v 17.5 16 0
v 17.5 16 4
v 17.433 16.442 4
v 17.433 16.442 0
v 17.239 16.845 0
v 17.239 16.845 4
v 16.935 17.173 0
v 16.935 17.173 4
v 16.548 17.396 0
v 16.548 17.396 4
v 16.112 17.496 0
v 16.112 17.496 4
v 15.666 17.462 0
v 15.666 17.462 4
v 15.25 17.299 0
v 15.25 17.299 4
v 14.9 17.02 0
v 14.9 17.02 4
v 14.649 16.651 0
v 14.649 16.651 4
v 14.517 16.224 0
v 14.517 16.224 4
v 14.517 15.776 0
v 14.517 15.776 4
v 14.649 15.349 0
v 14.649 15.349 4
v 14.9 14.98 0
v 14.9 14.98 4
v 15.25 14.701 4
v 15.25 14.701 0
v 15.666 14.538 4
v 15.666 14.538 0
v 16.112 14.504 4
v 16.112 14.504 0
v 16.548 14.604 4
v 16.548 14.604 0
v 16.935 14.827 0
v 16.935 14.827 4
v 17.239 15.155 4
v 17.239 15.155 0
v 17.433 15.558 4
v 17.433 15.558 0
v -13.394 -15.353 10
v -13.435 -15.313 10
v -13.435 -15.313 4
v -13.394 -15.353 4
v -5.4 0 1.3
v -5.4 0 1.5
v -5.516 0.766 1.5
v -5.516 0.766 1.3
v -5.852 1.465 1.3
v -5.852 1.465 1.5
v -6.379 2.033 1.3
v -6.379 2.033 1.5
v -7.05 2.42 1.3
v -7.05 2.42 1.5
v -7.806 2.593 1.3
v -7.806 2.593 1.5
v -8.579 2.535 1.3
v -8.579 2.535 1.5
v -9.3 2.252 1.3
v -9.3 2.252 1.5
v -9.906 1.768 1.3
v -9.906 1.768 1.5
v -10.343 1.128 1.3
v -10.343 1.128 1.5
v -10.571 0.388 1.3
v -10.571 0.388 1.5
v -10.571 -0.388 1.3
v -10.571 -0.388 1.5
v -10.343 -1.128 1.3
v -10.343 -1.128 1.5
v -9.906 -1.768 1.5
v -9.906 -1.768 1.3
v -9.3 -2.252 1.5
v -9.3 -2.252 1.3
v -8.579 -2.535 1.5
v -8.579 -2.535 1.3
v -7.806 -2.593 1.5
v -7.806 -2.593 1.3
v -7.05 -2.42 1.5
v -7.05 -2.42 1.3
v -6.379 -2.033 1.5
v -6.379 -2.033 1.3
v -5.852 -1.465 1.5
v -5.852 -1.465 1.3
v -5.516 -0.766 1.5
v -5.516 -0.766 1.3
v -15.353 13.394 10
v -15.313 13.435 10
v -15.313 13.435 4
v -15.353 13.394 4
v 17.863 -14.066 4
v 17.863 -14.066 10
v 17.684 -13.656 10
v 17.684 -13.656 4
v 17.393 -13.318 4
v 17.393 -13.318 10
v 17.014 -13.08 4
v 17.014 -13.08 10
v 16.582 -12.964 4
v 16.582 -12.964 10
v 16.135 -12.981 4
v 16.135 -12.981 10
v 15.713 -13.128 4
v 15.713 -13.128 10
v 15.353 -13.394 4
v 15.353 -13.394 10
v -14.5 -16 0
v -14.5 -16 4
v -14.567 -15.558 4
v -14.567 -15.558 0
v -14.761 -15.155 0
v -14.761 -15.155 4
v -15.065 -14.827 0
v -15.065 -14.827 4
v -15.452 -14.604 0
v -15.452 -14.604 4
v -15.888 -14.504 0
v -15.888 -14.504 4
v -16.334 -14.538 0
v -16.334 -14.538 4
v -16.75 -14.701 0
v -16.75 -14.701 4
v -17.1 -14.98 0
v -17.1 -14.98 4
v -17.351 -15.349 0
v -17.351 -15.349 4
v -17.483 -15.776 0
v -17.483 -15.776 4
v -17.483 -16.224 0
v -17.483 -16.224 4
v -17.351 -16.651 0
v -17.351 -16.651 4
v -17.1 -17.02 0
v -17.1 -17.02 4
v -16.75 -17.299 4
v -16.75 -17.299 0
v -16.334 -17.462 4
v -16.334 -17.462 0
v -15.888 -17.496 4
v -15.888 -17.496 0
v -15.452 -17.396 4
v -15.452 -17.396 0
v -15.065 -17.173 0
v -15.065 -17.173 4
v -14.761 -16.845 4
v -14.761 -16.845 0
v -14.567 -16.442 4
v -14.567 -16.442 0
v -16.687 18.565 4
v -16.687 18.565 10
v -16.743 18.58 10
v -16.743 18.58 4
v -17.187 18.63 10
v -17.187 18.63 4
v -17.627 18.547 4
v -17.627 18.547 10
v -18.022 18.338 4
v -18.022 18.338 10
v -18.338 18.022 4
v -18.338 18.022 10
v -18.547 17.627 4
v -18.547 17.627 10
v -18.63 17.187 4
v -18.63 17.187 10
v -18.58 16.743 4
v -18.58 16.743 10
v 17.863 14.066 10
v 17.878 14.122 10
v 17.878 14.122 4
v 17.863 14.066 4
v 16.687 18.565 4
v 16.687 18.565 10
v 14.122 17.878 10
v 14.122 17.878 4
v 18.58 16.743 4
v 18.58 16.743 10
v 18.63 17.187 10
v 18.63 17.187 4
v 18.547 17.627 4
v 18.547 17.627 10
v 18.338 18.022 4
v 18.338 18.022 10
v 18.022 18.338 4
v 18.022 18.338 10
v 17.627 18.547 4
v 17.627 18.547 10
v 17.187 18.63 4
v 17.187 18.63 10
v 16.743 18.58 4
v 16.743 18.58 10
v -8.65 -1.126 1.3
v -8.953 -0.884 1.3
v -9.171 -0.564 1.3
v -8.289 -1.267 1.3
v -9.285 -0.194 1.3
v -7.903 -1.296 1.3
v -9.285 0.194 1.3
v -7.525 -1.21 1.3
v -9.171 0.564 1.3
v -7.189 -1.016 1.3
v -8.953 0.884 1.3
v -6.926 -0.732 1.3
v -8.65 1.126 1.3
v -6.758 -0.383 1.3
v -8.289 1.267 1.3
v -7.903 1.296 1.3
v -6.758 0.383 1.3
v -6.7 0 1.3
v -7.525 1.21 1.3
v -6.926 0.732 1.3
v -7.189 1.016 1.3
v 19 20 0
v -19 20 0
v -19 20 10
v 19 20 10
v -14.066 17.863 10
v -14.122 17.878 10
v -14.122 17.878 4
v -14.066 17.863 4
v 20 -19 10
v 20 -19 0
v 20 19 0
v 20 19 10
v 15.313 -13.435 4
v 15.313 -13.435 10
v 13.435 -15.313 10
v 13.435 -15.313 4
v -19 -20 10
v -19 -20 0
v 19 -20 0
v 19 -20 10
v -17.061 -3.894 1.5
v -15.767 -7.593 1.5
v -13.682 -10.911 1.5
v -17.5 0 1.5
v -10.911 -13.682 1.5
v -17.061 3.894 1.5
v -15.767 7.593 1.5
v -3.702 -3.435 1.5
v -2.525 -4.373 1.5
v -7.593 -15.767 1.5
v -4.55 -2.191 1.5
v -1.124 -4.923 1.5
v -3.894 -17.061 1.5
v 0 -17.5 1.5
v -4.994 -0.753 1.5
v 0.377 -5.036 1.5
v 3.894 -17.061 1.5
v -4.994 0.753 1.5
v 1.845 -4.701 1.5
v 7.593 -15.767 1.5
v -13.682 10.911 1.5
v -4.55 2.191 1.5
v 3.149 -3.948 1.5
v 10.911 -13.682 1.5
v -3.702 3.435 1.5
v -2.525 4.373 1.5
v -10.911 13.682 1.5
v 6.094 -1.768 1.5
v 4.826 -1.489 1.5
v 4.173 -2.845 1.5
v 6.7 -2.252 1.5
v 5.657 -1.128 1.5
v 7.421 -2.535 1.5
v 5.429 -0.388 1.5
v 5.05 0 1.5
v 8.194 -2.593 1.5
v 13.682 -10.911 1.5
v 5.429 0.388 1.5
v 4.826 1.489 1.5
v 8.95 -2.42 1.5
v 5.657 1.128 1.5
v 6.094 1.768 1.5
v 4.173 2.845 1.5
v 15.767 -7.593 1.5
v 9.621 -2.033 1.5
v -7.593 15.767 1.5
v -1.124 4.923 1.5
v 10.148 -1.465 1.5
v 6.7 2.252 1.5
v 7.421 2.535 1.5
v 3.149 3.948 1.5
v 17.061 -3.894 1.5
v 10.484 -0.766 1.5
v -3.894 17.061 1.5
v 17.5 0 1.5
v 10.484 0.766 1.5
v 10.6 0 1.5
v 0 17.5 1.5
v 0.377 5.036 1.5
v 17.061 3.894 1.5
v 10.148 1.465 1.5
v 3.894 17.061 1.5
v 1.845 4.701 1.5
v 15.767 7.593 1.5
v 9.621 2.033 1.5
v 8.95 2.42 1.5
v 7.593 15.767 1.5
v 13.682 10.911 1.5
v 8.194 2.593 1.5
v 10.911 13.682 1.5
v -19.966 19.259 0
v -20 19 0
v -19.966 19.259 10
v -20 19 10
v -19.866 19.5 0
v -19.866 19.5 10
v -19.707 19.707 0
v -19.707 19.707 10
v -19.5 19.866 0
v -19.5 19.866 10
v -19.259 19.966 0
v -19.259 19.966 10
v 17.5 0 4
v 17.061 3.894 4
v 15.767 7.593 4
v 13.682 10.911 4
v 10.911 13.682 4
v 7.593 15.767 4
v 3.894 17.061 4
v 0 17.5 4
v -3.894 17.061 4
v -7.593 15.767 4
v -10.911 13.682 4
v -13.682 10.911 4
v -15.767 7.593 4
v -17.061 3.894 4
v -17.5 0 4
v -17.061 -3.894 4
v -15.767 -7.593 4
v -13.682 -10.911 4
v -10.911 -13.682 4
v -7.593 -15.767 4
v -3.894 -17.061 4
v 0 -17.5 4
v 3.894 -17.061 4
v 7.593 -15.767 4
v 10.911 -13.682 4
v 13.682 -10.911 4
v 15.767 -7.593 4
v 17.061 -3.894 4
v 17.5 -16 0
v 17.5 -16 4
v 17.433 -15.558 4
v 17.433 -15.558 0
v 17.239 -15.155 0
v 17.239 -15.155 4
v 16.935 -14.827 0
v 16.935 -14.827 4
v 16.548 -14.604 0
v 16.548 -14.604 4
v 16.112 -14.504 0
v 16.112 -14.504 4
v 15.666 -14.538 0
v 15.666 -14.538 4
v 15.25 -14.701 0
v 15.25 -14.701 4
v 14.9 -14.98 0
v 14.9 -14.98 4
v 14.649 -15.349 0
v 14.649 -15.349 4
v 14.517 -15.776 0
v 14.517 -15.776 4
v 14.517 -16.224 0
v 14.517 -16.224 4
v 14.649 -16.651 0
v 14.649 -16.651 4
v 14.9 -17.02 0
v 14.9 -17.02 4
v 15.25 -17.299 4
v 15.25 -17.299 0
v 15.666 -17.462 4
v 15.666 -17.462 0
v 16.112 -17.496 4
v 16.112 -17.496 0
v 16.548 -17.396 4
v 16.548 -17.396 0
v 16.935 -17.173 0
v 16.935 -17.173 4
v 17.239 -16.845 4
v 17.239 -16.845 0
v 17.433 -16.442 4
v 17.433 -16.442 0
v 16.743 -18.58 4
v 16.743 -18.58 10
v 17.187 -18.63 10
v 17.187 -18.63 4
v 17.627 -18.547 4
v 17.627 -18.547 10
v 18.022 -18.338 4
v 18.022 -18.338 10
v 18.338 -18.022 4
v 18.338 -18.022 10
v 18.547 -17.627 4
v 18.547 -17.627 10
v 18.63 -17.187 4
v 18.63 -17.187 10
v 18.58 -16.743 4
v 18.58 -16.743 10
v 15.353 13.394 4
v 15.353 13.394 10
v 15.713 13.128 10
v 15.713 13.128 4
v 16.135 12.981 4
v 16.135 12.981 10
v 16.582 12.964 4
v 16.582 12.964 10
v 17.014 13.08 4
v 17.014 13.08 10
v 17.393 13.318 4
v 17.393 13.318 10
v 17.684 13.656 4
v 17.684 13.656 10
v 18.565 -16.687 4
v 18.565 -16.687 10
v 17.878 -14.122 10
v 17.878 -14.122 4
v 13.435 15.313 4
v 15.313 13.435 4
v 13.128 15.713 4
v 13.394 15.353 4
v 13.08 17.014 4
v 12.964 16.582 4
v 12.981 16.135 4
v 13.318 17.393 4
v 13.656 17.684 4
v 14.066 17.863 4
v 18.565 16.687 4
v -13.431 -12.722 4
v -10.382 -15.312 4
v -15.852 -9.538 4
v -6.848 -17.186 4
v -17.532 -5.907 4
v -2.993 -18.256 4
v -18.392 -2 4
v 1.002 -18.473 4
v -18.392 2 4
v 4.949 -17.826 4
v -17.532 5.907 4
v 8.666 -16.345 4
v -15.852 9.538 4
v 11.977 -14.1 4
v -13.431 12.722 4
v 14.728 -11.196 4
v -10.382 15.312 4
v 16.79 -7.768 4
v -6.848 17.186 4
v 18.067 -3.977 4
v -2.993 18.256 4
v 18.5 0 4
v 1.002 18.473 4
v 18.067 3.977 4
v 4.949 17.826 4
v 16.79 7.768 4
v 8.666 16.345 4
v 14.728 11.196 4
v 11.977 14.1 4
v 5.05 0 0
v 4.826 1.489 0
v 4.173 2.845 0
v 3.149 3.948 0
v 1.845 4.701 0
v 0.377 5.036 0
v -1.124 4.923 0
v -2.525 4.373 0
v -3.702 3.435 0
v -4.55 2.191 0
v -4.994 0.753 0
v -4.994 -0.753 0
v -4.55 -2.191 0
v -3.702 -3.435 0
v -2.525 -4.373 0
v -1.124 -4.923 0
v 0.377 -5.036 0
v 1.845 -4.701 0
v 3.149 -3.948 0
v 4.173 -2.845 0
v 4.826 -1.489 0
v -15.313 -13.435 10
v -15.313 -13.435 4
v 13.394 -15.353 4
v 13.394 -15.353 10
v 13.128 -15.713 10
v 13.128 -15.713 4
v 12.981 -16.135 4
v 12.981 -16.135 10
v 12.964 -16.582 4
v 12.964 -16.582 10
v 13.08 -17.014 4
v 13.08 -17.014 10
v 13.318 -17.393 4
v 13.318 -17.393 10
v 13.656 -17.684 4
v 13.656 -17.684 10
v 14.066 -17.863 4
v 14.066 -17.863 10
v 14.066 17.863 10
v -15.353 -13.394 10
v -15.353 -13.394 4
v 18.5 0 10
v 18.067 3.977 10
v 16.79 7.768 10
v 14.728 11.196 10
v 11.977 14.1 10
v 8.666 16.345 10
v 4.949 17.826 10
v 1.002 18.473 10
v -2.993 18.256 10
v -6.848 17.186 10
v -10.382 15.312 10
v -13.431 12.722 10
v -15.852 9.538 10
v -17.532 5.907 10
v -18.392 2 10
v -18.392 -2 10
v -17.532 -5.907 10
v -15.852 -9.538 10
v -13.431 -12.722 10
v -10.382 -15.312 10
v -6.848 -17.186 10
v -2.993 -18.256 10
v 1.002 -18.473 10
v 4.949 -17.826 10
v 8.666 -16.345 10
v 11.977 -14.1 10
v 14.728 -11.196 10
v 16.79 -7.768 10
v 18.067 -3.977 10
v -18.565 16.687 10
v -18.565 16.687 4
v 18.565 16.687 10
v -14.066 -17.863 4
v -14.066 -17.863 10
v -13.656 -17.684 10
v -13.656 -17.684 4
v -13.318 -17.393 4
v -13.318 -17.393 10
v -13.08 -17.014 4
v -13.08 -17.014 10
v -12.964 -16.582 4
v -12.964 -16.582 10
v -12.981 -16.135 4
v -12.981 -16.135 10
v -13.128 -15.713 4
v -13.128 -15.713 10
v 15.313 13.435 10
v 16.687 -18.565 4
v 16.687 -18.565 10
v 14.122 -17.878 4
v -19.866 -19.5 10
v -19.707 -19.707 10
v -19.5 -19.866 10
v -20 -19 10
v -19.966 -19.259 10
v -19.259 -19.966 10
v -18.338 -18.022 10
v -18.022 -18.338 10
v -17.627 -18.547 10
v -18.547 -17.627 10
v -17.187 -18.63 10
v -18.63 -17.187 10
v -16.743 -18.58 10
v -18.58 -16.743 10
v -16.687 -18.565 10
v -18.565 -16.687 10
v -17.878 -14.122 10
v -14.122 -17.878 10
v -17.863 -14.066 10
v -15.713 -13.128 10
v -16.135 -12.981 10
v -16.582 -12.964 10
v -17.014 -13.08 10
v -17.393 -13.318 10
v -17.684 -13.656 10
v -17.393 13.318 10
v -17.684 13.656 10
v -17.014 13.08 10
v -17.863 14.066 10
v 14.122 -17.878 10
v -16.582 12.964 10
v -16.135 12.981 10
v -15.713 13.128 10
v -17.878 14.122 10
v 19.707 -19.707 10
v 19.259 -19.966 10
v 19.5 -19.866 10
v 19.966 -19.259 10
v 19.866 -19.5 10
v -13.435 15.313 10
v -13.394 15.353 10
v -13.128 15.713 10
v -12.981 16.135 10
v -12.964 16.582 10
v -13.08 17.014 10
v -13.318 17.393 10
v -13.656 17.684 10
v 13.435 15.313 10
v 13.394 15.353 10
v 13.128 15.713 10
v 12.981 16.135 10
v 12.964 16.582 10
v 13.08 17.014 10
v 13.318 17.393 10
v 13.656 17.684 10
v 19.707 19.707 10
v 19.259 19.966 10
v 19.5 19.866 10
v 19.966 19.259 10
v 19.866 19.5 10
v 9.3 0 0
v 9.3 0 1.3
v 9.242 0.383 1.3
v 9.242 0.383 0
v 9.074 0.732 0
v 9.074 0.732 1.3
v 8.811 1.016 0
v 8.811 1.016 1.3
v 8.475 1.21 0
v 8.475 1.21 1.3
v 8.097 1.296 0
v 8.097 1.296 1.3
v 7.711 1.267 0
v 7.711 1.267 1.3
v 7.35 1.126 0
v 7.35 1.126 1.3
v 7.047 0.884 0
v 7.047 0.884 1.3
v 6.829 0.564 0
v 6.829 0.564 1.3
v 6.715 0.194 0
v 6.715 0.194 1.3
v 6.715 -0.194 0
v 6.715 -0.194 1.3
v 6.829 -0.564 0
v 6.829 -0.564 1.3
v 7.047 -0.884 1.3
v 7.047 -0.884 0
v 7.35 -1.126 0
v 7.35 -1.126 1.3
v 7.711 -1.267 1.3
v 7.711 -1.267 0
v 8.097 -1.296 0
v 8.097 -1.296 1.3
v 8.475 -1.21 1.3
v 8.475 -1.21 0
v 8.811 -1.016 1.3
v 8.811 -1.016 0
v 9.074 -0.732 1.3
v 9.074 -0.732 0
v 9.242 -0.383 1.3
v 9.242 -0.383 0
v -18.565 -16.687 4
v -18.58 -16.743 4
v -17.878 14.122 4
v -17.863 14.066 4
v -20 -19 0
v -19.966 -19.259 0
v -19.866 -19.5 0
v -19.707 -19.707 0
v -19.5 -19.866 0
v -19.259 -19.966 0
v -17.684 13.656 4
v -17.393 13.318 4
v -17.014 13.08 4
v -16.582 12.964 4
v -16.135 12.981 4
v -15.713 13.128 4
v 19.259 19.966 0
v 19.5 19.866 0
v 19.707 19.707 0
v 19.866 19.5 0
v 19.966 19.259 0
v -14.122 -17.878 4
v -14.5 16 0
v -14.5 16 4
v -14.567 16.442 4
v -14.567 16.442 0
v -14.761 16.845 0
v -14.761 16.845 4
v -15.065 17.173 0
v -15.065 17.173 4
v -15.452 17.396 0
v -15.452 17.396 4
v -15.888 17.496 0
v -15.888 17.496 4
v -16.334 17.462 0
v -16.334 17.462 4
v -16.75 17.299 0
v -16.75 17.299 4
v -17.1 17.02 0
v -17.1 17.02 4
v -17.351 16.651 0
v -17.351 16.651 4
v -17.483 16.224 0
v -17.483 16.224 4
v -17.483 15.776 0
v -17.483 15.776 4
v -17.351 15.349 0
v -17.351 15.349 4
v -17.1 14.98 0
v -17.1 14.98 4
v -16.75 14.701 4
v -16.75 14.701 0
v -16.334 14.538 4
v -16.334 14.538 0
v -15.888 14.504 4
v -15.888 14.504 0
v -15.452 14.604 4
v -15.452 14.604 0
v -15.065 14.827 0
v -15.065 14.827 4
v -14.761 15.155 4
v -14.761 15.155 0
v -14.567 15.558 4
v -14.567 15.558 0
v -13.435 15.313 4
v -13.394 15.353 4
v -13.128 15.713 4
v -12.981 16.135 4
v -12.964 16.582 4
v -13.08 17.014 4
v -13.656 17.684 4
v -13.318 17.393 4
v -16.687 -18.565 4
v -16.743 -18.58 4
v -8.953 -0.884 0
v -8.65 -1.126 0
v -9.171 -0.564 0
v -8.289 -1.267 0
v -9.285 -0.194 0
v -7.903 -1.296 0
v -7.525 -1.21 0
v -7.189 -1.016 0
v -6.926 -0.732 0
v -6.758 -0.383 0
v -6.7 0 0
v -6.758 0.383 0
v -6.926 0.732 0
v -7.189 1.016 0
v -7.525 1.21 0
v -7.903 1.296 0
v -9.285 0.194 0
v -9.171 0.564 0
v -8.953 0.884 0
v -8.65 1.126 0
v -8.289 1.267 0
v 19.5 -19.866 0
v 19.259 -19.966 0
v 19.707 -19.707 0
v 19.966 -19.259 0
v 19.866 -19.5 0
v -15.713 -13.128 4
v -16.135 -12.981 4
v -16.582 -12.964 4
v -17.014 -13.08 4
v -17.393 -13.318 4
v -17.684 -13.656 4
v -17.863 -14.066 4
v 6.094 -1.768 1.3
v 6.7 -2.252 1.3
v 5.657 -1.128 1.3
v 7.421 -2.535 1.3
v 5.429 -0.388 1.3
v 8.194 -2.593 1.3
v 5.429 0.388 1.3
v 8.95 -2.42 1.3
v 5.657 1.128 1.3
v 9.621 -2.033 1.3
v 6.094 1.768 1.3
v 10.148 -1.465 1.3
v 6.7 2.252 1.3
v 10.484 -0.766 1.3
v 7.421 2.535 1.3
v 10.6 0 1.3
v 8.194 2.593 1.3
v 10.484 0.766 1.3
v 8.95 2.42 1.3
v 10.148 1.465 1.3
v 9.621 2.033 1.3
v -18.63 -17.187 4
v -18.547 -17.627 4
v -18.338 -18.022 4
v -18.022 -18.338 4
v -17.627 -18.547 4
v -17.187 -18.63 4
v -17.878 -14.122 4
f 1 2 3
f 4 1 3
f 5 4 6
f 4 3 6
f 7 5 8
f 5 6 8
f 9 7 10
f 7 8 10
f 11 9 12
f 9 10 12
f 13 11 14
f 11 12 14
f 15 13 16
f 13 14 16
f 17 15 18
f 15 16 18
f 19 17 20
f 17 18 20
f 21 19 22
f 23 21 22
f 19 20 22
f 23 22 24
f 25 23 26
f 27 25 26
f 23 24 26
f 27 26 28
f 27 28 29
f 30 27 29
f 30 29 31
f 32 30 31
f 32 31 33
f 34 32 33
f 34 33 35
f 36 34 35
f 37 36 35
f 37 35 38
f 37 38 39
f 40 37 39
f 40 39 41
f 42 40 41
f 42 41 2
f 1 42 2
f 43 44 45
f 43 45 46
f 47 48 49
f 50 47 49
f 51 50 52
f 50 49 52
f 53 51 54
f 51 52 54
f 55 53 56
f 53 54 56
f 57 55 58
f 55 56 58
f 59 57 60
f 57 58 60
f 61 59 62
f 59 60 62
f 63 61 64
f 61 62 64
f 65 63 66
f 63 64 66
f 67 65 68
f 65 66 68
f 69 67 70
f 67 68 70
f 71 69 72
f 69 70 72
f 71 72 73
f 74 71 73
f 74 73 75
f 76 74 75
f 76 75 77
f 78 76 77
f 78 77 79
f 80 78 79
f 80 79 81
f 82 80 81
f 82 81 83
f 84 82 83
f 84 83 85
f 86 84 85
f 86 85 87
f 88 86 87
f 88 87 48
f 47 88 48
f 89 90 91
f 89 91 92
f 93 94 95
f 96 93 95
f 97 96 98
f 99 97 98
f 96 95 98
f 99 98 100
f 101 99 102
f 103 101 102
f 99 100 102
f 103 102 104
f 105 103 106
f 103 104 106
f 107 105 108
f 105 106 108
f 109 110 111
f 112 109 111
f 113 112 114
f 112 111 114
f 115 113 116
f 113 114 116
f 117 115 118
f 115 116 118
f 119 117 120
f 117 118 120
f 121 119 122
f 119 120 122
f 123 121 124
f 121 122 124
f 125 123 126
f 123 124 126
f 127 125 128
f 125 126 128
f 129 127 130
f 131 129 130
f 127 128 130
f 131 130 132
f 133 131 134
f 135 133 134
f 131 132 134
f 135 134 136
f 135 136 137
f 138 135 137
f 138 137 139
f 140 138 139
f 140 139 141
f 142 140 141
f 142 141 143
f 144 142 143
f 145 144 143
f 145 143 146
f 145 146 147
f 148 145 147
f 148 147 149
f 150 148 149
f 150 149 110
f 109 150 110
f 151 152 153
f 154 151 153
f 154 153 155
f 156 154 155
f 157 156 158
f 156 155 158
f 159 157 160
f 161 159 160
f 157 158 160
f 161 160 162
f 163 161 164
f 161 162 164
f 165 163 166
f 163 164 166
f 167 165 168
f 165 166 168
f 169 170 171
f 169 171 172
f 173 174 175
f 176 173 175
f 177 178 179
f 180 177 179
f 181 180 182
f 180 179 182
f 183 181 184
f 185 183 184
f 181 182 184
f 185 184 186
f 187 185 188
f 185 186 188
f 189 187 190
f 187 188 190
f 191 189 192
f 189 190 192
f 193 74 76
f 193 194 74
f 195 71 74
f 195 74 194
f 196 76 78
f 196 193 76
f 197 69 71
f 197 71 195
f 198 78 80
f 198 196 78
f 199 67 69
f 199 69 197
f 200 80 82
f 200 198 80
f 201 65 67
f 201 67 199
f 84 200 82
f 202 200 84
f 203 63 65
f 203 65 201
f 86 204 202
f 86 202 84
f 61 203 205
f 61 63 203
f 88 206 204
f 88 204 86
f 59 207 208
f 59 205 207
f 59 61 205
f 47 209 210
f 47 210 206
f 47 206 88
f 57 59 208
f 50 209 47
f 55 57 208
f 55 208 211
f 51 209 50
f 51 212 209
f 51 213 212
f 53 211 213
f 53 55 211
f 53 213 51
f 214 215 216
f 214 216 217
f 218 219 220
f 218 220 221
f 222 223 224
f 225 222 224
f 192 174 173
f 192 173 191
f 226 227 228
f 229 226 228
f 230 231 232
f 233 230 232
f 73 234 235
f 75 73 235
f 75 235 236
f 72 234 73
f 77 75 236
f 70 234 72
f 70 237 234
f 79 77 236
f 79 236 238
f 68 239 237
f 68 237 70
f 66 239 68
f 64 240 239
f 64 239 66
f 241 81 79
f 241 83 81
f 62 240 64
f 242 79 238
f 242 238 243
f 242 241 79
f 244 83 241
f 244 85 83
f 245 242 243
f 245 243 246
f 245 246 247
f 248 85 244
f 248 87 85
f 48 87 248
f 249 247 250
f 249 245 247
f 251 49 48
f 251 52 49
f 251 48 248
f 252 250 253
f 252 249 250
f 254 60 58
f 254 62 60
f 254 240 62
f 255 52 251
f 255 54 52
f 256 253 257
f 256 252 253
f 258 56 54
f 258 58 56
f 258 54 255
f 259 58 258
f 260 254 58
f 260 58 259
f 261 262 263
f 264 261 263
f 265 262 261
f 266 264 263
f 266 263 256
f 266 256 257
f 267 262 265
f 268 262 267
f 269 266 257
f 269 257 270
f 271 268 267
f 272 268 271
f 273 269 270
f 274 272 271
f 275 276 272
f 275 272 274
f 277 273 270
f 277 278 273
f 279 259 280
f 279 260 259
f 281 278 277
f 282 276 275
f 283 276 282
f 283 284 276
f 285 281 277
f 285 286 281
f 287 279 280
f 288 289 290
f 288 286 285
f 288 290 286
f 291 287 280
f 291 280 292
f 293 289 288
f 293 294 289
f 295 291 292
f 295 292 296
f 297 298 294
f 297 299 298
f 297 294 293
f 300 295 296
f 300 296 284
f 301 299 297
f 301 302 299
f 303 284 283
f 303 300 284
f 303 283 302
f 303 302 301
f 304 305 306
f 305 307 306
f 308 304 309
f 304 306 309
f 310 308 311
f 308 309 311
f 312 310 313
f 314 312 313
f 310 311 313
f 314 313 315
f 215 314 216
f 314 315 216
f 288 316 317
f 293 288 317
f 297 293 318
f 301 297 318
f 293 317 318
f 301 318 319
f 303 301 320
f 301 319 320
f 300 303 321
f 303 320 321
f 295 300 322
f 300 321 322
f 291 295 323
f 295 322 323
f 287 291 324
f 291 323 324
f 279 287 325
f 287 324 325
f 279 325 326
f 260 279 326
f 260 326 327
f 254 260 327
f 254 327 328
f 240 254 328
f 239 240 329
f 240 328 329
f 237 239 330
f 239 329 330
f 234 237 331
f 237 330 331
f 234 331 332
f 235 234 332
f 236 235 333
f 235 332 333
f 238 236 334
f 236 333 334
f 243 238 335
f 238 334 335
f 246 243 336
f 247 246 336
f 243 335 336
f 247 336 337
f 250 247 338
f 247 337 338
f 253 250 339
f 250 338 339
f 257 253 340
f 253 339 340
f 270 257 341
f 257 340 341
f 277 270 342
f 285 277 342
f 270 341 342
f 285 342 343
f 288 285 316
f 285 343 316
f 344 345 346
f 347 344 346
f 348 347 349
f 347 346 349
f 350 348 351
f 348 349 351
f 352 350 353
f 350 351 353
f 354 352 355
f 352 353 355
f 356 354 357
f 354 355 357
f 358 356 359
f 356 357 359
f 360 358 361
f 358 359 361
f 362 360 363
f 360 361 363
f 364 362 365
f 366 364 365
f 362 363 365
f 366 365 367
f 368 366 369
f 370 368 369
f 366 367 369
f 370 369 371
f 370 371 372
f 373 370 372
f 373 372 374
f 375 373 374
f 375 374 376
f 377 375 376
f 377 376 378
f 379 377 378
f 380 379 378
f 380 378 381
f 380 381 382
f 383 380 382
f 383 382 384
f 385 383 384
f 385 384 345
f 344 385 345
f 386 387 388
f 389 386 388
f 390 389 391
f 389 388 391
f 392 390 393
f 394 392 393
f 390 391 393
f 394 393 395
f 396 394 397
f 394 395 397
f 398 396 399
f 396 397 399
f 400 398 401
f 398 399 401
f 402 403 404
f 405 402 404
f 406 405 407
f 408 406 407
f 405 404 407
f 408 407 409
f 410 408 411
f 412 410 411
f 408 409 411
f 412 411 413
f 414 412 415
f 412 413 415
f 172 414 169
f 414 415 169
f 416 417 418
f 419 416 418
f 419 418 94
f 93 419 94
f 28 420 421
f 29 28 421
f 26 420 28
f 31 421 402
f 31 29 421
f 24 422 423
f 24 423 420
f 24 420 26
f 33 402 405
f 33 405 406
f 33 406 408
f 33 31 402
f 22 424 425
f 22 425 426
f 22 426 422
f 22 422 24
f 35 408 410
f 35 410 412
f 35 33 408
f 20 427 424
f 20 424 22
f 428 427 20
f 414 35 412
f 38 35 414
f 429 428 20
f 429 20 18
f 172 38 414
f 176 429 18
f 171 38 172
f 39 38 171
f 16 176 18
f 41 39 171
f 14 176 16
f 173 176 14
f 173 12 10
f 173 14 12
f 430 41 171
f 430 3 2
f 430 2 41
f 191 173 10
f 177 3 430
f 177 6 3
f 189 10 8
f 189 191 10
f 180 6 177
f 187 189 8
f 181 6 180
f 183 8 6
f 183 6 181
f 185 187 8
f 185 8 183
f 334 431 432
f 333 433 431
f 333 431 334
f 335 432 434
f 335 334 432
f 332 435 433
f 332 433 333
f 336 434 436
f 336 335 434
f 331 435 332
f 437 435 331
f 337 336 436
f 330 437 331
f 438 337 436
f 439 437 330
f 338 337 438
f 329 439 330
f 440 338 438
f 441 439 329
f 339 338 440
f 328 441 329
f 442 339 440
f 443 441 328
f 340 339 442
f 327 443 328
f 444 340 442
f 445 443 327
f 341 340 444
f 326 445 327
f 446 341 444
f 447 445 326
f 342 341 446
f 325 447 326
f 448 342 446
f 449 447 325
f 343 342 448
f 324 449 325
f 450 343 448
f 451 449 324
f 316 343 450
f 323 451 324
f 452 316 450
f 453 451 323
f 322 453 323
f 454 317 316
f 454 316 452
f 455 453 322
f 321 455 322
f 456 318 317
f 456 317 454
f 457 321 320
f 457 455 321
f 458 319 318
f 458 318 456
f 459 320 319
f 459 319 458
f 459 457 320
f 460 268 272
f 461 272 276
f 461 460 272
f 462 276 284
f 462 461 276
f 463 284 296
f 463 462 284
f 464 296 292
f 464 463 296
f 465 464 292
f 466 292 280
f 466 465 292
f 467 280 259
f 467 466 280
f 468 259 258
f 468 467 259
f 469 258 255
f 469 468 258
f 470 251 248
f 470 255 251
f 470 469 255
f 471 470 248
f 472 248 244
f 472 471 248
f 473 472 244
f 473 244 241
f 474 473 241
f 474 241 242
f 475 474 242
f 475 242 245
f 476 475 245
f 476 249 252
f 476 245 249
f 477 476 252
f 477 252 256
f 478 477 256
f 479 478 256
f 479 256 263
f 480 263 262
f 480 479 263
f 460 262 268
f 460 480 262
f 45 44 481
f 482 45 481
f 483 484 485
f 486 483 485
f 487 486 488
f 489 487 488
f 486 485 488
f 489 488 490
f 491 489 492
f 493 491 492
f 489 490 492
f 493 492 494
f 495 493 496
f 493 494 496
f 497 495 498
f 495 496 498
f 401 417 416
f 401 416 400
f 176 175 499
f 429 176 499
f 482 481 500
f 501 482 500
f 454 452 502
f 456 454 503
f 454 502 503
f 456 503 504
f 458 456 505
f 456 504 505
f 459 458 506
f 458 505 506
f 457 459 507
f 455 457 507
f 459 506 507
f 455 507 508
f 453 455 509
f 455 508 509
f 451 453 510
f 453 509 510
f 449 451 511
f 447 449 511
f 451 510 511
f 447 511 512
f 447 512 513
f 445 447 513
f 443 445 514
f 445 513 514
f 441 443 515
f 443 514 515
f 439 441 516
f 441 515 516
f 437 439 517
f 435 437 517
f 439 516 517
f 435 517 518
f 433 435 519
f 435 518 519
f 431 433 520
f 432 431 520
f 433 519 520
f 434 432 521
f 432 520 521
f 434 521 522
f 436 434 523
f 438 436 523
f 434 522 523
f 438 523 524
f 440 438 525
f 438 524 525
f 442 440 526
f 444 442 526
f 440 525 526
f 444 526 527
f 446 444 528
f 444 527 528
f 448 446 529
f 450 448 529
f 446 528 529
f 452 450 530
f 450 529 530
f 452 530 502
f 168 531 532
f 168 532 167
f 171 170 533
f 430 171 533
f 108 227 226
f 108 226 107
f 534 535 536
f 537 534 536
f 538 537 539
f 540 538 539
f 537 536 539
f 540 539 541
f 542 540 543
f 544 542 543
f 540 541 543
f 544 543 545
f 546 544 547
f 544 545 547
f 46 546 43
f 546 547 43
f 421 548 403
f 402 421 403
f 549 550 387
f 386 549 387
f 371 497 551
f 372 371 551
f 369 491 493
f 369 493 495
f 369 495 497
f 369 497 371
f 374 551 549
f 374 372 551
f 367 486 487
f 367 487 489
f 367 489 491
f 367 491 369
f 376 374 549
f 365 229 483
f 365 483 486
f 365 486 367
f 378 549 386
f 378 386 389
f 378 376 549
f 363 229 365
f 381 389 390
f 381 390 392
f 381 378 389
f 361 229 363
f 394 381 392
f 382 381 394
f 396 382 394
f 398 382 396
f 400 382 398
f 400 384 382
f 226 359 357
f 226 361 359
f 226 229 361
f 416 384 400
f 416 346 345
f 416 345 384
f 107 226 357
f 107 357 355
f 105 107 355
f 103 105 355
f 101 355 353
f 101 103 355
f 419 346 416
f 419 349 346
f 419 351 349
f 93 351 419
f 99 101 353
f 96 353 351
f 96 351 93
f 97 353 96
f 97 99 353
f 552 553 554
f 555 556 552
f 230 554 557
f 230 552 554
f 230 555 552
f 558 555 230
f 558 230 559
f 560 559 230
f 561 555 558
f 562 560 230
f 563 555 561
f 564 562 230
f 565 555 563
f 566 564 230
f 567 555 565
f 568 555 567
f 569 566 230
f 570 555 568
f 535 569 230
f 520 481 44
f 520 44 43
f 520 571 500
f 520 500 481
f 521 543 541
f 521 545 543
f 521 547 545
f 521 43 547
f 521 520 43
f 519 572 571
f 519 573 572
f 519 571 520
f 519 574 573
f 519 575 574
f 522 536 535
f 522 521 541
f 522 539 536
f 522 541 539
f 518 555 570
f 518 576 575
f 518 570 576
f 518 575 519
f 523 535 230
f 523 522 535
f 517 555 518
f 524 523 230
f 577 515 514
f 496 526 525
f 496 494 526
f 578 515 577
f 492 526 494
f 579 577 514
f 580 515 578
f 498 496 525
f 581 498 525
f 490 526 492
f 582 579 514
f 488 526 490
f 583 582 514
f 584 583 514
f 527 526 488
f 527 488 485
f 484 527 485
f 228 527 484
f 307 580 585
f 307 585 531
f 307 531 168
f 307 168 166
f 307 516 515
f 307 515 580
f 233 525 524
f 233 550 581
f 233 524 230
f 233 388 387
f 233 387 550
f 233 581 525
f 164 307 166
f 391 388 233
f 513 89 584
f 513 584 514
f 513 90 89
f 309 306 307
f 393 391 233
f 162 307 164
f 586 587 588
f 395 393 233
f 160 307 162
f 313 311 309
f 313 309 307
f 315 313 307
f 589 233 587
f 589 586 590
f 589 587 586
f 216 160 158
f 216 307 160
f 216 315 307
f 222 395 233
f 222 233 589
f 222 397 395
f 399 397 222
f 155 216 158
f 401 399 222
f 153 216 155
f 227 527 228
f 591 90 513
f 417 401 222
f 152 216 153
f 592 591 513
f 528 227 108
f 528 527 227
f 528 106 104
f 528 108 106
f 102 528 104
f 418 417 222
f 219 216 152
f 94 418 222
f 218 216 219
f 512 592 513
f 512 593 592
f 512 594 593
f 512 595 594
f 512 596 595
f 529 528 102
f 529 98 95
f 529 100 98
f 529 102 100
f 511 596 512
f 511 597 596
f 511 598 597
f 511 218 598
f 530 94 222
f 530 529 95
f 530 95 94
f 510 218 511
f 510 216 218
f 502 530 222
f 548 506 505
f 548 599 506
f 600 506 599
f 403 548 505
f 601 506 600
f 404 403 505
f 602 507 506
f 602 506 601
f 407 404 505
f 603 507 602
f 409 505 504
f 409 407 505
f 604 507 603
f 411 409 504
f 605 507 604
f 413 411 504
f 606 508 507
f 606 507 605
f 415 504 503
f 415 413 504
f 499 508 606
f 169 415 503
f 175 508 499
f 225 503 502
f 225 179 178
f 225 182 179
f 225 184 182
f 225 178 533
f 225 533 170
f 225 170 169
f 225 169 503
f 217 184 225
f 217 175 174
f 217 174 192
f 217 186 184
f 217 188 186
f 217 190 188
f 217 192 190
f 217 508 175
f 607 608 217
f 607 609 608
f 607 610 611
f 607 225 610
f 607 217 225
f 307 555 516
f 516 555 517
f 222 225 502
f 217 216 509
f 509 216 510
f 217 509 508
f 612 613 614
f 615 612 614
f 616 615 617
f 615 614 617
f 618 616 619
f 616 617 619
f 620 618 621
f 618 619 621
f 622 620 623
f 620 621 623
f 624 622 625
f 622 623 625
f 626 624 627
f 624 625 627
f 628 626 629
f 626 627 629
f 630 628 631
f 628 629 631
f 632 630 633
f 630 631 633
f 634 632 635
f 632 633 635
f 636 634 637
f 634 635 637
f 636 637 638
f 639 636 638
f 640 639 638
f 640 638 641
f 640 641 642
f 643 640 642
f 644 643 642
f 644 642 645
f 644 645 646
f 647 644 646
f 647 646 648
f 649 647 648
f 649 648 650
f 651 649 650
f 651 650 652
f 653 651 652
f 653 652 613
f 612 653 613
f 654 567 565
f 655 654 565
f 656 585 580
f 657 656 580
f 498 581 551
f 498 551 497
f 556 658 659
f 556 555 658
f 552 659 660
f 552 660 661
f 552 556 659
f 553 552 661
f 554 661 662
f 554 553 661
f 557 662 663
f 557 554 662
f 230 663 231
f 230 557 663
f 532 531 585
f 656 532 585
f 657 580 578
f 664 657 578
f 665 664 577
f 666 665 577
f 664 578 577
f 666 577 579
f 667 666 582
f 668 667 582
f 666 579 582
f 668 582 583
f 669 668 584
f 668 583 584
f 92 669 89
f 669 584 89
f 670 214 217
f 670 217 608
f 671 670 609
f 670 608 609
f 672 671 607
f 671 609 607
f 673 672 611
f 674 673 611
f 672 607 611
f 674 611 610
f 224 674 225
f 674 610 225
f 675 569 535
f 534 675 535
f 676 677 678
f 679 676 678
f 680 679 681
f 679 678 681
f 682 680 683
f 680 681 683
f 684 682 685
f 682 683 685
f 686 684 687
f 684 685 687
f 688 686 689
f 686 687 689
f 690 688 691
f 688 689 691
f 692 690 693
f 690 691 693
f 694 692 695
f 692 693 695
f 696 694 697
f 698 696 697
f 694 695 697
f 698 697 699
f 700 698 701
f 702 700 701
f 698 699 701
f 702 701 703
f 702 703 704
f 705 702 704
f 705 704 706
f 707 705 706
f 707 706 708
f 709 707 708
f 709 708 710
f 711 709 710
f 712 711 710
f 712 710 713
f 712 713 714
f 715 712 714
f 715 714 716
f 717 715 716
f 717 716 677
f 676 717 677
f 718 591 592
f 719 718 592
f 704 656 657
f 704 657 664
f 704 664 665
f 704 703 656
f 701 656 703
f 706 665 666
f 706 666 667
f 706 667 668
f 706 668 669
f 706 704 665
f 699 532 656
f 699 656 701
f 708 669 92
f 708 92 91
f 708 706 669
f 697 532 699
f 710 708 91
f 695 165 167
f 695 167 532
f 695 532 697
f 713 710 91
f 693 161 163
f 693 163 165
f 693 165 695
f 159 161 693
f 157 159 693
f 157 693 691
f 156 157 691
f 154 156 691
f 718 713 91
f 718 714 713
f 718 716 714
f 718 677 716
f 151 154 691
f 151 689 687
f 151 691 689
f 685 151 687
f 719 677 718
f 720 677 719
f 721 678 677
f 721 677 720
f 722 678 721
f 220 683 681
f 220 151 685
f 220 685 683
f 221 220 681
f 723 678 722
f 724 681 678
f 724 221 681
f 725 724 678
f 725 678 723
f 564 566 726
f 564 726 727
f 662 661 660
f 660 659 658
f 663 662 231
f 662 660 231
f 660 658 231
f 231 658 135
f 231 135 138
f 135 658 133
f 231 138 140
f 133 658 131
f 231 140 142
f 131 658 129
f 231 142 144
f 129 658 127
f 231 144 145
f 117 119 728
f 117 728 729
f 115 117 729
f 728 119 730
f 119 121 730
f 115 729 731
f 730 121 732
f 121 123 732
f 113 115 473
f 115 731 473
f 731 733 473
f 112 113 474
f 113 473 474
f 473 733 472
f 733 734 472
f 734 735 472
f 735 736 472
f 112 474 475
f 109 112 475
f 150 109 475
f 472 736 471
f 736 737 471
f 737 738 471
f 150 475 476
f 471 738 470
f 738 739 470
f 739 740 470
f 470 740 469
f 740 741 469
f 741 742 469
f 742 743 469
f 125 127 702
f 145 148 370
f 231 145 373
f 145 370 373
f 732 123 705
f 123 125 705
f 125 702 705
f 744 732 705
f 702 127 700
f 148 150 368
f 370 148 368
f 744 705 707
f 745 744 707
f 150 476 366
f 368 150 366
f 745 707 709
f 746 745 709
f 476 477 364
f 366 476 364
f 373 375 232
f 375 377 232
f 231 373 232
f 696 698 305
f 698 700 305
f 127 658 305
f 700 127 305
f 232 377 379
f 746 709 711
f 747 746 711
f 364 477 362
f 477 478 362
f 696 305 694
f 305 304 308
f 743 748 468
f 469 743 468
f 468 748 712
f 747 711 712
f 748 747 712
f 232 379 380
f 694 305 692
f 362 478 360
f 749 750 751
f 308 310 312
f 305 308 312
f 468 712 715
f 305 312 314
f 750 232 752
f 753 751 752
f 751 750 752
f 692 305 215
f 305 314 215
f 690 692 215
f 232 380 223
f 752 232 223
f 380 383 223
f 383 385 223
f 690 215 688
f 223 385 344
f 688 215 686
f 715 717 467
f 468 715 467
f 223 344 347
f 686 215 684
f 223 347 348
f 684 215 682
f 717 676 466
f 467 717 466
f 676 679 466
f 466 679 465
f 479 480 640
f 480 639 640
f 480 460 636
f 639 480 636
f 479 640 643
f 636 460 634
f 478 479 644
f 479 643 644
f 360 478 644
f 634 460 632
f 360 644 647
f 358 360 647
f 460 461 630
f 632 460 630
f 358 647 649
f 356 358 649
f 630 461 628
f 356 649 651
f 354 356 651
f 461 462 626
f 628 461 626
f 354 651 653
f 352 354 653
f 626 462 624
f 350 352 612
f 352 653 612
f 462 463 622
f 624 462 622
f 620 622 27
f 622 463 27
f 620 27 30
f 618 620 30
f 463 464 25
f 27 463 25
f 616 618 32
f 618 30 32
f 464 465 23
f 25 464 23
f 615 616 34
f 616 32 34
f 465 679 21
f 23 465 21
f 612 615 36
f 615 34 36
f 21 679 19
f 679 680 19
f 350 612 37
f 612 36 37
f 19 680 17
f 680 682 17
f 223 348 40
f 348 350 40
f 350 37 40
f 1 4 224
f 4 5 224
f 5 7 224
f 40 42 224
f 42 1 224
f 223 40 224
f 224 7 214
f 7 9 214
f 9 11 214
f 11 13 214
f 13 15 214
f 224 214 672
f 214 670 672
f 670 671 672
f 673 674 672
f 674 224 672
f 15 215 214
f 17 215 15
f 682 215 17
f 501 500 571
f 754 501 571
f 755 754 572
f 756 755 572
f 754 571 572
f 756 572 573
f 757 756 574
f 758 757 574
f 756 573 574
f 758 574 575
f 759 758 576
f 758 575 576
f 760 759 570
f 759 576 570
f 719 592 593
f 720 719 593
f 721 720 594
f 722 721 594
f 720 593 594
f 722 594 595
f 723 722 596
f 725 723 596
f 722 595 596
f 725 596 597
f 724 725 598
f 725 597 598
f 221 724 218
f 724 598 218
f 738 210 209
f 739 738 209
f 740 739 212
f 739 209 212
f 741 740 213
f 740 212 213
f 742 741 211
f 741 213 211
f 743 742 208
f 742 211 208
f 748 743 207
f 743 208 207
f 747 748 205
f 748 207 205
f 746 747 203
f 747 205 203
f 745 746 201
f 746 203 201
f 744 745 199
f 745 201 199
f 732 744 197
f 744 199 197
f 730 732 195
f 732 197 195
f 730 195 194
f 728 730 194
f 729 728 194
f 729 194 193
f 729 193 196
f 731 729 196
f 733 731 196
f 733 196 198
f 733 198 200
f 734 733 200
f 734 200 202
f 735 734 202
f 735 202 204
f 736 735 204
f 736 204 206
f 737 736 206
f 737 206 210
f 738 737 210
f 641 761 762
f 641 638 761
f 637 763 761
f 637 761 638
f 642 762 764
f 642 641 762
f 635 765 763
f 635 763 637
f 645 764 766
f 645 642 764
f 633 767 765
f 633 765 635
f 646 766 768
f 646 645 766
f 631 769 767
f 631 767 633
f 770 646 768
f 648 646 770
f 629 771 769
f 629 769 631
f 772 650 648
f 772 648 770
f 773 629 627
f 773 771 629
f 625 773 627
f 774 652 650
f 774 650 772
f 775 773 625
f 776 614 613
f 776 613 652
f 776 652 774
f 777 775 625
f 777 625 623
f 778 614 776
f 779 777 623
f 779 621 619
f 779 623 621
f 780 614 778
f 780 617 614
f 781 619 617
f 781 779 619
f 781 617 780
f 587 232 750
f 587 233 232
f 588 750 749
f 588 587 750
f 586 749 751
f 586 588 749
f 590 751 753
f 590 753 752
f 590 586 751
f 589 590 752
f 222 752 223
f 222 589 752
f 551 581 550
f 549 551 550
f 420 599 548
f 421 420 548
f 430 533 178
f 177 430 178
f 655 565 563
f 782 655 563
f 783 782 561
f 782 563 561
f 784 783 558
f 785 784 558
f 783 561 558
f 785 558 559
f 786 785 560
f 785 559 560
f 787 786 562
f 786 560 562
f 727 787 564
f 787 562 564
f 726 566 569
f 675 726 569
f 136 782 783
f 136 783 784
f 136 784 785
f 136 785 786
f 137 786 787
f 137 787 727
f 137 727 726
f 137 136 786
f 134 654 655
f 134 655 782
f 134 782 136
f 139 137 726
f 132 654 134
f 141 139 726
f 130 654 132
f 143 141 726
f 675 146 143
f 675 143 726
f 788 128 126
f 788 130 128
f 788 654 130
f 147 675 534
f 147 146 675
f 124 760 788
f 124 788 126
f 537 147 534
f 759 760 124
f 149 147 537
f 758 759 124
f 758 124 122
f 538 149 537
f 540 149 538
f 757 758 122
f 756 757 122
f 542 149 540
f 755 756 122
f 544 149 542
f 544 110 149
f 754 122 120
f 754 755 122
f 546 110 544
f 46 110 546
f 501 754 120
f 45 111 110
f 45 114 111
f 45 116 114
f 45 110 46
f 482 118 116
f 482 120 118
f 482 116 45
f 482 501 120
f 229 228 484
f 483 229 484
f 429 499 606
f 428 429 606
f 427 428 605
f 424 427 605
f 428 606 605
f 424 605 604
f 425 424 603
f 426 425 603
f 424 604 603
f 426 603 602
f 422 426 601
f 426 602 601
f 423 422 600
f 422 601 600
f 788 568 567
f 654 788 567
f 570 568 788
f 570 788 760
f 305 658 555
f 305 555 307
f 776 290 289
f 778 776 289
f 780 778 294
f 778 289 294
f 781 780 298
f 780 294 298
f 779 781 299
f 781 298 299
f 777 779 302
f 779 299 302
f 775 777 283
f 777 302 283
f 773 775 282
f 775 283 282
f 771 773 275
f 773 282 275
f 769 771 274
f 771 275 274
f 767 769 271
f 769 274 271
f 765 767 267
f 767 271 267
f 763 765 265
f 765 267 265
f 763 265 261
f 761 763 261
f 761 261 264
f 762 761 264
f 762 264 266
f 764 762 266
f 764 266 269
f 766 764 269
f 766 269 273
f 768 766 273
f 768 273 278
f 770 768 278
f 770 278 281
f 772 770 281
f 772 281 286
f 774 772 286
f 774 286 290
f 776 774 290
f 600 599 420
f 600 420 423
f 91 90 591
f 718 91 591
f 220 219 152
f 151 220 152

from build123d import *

# Parameters (mm, degrees)
SKETCH_W        = 40
SKETCH_H        = 40
SKETCH_R        = 5.05
PAD_DEPTH       = 10
SKETCH001_R     = 1.3
POCKET_DEPTH    = 10.001
SKETCH002_R     = 2.6
POCKET001_DEPTH = 8.7
SKETCH005_R     = 1.5
POCKET003_DEPTH = 10.001
POCKET004_DEPTH = 6
SKETCH006_R     = 18.5
POCKET005_DEPTH = 6
SKETCH007_R     = 17.5
POCKET006_DEPTH = 2.5
FILLET_R        = 1


with BuildPart() as part:
    # Sketch → Pad (new body)
    with BuildSketch(Plane.XY):
        Rectangle(SKETCH_W, SKETCH_H)
        Circle(SKETCH_R, mode=Mode.SUBTRACT)
    extrude(amount=PAD_DEPTH)

    # Sketch001 (on Face7 of Pad) → Pocket (cut, through all)
    with BuildSketch(Plane.XY.offset(10)):
        with Locations((8, 0)):
            Circle(SKETCH001_R)
        with Locations((-8, 0)):
            Circle(SKETCH001_R)
    extrude(amount=-POCKET_DEPTH, mode=Mode.SUBTRACT)

    # Sketch002 (on Face5 of Pocket) → Pocket001 (cut)
    with BuildSketch(Plane.XY.offset(10)):
        with Locations((-8, 0)):
            Circle(SKETCH002_R)
        with Locations((8, 0)):
            Circle(SKETCH002_R)
    extrude(amount=-POCKET001_DEPTH, mode=Mode.SUBTRACT)

    # Sketch005 (on Face5 of Pocket001) → Pocket003 (cut, through all)
    with BuildSketch(Plane.XY.offset(10)):
        with Locations((-16, 16)):
            Circle(SKETCH005_R)
        with Locations((16, 16)):
            Circle(SKETCH005_R)
        with Locations((-16, -16)):
            Circle(SKETCH005_R)
        with Locations((16, -16)):
            Circle(SKETCH005_R)
    extrude(amount=-POCKET003_DEPTH, mode=Mode.SUBTRACT)

    # Sketch004 (on Face5 of Pocket003) → Pocket004 (cut)
    with BuildSketch(Plane.XY.offset(10)):
        with BuildLine():
            Line((13.434683, 15.312625), (15.312625, 13.434683))
            Line((15.312625, 13.434683), (15.35345, 13.393859))
            ThreePointArc((15.35345, 13.393859), (16.802339, 13.00563), (17.862999, 14.06629))
            Line((17.877942, 14.122058), (17.862999, 14.06629))
            Line((17.877942, 14.122058), (18.565317, 16.687375))
            Line((18.565317, 16.687375), (18.58026, 16.743142))
            ThreePointArc((18.58026, 16.743142), (18.192031, 18.192031), (16.743142, 18.58026))
            Line((16.687375, 18.565317), (16.743142, 18.58026))
            Line((16.687375, 18.565317), (14.122058, 17.877942))
            Line((14.122058, 17.877942), (14.06629, 17.862999))
            ThreePointArc((14.06629, 17.862999), (13.00563, 16.802339), (13.393859, 15.35345))
            Line((13.434683, 15.312625), (13.393859, 15.35345))
        make_face()
        with BuildLine():
            Line((14.122058, -17.877942), (16.687375, -18.565317))
            Line((16.687375, -18.565317), (16.743142, -18.58026))
            ThreePointArc((16.743142, -18.58026), (18.192031, -18.192031), (18.58026, -16.743142))
            Line((18.565317, -16.687375), (18.58026, -16.743142))
            Line((18.565317, -16.687375), (17.877942, -14.122058))
            Line((17.877942, -14.122058), (17.862999, -14.06629))
            ThreePointArc((17.862999, -14.06629), (16.802339, -13.00563), (15.35345, -13.393859))
            Line((15.312625, -13.434683), (15.35345, -13.393859))
            Line((15.312625, -13.434683), (13.434683, -15.312625))
            Line((13.434683, -15.312625), (13.393859, -15.35345))
            ThreePointArc((13.393859, -15.35345), (13.00563, -16.802339), (14.06629, -17.862999))
            Line((14.122058, -17.877942), (14.06629, -17.862999))
        make_face()
        with BuildLine():
            Line((-14.122058, 17.877942), (-16.687375, 18.565317))
            Line((-16.687375, 18.565317), (-16.743142, 18.58026))
            ThreePointArc((-16.743142, 18.58026), (-18.192031, 18.192031), (-18.58026, 16.743142))
            Line((-18.565317, 16.687375), (-18.58026, 16.743142))
            Line((-18.565317, 16.687375), (-17.877942, 14.122058))
            Line((-17.877942, 14.122058), (-17.862999, 14.06629))
            ThreePointArc((-17.862999, 14.06629), (-16.802339, 13.00563), (-15.35345, 13.393859))
            Line((-15.312625, 13.434683), (-15.35345, 13.393859))
            Line((-15.312625, 13.434683), (-13.434683, 15.312625))
            Line((-13.434683, 15.312625), (-13.393859, 15.35345))
            ThreePointArc((-13.393859, 15.35345), (-13.00563, 16.802339), (-14.06629, 17.862999))
            Line((-14.122058, 17.877942), (-14.06629, 17.862999))
        make_face()
        with BuildLine():
            Line((-13.434683, -15.312625), (-15.312625, -13.434683))
            Line((-15.312625, -13.434683), (-15.35345, -13.393859))
            ThreePointArc((-15.35345, -13.393859), (-16.802339, -13.00563), (-17.862999, -14.06629))
            Line((-17.877942, -14.122058), (-17.862999, -14.06629))
            Line((-17.877942, -14.122058), (-18.565317, -16.687375))
            Line((-18.565317, -16.687375), (-18.58026, -16.743142))
            ThreePointArc((-18.58026, -16.743142), (-18.192031, -18.192031), (-16.743142, -18.58026))
            Line((-16.687375, -18.565317), (-16.743142, -18.58026))
            Line((-16.687375, -18.565317), (-14.122058, -17.877942))
            Line((-14.122058, -17.877942), (-14.06629, -17.862999))
            ThreePointArc((-14.06629, -17.862999), (-13.00563, -16.802339), (-13.393859, -15.35345))
            Line((-13.434683, -15.312625), (-13.393859, -15.35345))
        make_face()
    extrude(amount=-POCKET004_DEPTH, mode=Mode.SUBTRACT)

    # Sketch006 (on Face5 of Pocket004) → Pocket005 (cut)
    with BuildSketch(Plane.XY.offset(10)):
        Circle(SKETCH006_R)
    extrude(amount=-POCKET005_DEPTH, mode=Mode.SUBTRACT)

    # Sketch007 (on Face67 of Pocket005) → Pocket006 (cut)
    with BuildSketch(Plane.XY.offset(4)):
        Circle(SKETCH007_R)
    extrude(amount=-POCKET006_DEPTH, mode=Mode.SUBTRACT)

    # Fillet
    fillet_edges = [part.edges().sort_by_distance(p)[0] for p in [
        (20, -20, 5),
        (-20, -20, 5),
        (-20, 20, 5),
        (20, 20, 5),
    ]]
    fillet(fillet_edges, radius=FILLET_R)


solid = part.part
